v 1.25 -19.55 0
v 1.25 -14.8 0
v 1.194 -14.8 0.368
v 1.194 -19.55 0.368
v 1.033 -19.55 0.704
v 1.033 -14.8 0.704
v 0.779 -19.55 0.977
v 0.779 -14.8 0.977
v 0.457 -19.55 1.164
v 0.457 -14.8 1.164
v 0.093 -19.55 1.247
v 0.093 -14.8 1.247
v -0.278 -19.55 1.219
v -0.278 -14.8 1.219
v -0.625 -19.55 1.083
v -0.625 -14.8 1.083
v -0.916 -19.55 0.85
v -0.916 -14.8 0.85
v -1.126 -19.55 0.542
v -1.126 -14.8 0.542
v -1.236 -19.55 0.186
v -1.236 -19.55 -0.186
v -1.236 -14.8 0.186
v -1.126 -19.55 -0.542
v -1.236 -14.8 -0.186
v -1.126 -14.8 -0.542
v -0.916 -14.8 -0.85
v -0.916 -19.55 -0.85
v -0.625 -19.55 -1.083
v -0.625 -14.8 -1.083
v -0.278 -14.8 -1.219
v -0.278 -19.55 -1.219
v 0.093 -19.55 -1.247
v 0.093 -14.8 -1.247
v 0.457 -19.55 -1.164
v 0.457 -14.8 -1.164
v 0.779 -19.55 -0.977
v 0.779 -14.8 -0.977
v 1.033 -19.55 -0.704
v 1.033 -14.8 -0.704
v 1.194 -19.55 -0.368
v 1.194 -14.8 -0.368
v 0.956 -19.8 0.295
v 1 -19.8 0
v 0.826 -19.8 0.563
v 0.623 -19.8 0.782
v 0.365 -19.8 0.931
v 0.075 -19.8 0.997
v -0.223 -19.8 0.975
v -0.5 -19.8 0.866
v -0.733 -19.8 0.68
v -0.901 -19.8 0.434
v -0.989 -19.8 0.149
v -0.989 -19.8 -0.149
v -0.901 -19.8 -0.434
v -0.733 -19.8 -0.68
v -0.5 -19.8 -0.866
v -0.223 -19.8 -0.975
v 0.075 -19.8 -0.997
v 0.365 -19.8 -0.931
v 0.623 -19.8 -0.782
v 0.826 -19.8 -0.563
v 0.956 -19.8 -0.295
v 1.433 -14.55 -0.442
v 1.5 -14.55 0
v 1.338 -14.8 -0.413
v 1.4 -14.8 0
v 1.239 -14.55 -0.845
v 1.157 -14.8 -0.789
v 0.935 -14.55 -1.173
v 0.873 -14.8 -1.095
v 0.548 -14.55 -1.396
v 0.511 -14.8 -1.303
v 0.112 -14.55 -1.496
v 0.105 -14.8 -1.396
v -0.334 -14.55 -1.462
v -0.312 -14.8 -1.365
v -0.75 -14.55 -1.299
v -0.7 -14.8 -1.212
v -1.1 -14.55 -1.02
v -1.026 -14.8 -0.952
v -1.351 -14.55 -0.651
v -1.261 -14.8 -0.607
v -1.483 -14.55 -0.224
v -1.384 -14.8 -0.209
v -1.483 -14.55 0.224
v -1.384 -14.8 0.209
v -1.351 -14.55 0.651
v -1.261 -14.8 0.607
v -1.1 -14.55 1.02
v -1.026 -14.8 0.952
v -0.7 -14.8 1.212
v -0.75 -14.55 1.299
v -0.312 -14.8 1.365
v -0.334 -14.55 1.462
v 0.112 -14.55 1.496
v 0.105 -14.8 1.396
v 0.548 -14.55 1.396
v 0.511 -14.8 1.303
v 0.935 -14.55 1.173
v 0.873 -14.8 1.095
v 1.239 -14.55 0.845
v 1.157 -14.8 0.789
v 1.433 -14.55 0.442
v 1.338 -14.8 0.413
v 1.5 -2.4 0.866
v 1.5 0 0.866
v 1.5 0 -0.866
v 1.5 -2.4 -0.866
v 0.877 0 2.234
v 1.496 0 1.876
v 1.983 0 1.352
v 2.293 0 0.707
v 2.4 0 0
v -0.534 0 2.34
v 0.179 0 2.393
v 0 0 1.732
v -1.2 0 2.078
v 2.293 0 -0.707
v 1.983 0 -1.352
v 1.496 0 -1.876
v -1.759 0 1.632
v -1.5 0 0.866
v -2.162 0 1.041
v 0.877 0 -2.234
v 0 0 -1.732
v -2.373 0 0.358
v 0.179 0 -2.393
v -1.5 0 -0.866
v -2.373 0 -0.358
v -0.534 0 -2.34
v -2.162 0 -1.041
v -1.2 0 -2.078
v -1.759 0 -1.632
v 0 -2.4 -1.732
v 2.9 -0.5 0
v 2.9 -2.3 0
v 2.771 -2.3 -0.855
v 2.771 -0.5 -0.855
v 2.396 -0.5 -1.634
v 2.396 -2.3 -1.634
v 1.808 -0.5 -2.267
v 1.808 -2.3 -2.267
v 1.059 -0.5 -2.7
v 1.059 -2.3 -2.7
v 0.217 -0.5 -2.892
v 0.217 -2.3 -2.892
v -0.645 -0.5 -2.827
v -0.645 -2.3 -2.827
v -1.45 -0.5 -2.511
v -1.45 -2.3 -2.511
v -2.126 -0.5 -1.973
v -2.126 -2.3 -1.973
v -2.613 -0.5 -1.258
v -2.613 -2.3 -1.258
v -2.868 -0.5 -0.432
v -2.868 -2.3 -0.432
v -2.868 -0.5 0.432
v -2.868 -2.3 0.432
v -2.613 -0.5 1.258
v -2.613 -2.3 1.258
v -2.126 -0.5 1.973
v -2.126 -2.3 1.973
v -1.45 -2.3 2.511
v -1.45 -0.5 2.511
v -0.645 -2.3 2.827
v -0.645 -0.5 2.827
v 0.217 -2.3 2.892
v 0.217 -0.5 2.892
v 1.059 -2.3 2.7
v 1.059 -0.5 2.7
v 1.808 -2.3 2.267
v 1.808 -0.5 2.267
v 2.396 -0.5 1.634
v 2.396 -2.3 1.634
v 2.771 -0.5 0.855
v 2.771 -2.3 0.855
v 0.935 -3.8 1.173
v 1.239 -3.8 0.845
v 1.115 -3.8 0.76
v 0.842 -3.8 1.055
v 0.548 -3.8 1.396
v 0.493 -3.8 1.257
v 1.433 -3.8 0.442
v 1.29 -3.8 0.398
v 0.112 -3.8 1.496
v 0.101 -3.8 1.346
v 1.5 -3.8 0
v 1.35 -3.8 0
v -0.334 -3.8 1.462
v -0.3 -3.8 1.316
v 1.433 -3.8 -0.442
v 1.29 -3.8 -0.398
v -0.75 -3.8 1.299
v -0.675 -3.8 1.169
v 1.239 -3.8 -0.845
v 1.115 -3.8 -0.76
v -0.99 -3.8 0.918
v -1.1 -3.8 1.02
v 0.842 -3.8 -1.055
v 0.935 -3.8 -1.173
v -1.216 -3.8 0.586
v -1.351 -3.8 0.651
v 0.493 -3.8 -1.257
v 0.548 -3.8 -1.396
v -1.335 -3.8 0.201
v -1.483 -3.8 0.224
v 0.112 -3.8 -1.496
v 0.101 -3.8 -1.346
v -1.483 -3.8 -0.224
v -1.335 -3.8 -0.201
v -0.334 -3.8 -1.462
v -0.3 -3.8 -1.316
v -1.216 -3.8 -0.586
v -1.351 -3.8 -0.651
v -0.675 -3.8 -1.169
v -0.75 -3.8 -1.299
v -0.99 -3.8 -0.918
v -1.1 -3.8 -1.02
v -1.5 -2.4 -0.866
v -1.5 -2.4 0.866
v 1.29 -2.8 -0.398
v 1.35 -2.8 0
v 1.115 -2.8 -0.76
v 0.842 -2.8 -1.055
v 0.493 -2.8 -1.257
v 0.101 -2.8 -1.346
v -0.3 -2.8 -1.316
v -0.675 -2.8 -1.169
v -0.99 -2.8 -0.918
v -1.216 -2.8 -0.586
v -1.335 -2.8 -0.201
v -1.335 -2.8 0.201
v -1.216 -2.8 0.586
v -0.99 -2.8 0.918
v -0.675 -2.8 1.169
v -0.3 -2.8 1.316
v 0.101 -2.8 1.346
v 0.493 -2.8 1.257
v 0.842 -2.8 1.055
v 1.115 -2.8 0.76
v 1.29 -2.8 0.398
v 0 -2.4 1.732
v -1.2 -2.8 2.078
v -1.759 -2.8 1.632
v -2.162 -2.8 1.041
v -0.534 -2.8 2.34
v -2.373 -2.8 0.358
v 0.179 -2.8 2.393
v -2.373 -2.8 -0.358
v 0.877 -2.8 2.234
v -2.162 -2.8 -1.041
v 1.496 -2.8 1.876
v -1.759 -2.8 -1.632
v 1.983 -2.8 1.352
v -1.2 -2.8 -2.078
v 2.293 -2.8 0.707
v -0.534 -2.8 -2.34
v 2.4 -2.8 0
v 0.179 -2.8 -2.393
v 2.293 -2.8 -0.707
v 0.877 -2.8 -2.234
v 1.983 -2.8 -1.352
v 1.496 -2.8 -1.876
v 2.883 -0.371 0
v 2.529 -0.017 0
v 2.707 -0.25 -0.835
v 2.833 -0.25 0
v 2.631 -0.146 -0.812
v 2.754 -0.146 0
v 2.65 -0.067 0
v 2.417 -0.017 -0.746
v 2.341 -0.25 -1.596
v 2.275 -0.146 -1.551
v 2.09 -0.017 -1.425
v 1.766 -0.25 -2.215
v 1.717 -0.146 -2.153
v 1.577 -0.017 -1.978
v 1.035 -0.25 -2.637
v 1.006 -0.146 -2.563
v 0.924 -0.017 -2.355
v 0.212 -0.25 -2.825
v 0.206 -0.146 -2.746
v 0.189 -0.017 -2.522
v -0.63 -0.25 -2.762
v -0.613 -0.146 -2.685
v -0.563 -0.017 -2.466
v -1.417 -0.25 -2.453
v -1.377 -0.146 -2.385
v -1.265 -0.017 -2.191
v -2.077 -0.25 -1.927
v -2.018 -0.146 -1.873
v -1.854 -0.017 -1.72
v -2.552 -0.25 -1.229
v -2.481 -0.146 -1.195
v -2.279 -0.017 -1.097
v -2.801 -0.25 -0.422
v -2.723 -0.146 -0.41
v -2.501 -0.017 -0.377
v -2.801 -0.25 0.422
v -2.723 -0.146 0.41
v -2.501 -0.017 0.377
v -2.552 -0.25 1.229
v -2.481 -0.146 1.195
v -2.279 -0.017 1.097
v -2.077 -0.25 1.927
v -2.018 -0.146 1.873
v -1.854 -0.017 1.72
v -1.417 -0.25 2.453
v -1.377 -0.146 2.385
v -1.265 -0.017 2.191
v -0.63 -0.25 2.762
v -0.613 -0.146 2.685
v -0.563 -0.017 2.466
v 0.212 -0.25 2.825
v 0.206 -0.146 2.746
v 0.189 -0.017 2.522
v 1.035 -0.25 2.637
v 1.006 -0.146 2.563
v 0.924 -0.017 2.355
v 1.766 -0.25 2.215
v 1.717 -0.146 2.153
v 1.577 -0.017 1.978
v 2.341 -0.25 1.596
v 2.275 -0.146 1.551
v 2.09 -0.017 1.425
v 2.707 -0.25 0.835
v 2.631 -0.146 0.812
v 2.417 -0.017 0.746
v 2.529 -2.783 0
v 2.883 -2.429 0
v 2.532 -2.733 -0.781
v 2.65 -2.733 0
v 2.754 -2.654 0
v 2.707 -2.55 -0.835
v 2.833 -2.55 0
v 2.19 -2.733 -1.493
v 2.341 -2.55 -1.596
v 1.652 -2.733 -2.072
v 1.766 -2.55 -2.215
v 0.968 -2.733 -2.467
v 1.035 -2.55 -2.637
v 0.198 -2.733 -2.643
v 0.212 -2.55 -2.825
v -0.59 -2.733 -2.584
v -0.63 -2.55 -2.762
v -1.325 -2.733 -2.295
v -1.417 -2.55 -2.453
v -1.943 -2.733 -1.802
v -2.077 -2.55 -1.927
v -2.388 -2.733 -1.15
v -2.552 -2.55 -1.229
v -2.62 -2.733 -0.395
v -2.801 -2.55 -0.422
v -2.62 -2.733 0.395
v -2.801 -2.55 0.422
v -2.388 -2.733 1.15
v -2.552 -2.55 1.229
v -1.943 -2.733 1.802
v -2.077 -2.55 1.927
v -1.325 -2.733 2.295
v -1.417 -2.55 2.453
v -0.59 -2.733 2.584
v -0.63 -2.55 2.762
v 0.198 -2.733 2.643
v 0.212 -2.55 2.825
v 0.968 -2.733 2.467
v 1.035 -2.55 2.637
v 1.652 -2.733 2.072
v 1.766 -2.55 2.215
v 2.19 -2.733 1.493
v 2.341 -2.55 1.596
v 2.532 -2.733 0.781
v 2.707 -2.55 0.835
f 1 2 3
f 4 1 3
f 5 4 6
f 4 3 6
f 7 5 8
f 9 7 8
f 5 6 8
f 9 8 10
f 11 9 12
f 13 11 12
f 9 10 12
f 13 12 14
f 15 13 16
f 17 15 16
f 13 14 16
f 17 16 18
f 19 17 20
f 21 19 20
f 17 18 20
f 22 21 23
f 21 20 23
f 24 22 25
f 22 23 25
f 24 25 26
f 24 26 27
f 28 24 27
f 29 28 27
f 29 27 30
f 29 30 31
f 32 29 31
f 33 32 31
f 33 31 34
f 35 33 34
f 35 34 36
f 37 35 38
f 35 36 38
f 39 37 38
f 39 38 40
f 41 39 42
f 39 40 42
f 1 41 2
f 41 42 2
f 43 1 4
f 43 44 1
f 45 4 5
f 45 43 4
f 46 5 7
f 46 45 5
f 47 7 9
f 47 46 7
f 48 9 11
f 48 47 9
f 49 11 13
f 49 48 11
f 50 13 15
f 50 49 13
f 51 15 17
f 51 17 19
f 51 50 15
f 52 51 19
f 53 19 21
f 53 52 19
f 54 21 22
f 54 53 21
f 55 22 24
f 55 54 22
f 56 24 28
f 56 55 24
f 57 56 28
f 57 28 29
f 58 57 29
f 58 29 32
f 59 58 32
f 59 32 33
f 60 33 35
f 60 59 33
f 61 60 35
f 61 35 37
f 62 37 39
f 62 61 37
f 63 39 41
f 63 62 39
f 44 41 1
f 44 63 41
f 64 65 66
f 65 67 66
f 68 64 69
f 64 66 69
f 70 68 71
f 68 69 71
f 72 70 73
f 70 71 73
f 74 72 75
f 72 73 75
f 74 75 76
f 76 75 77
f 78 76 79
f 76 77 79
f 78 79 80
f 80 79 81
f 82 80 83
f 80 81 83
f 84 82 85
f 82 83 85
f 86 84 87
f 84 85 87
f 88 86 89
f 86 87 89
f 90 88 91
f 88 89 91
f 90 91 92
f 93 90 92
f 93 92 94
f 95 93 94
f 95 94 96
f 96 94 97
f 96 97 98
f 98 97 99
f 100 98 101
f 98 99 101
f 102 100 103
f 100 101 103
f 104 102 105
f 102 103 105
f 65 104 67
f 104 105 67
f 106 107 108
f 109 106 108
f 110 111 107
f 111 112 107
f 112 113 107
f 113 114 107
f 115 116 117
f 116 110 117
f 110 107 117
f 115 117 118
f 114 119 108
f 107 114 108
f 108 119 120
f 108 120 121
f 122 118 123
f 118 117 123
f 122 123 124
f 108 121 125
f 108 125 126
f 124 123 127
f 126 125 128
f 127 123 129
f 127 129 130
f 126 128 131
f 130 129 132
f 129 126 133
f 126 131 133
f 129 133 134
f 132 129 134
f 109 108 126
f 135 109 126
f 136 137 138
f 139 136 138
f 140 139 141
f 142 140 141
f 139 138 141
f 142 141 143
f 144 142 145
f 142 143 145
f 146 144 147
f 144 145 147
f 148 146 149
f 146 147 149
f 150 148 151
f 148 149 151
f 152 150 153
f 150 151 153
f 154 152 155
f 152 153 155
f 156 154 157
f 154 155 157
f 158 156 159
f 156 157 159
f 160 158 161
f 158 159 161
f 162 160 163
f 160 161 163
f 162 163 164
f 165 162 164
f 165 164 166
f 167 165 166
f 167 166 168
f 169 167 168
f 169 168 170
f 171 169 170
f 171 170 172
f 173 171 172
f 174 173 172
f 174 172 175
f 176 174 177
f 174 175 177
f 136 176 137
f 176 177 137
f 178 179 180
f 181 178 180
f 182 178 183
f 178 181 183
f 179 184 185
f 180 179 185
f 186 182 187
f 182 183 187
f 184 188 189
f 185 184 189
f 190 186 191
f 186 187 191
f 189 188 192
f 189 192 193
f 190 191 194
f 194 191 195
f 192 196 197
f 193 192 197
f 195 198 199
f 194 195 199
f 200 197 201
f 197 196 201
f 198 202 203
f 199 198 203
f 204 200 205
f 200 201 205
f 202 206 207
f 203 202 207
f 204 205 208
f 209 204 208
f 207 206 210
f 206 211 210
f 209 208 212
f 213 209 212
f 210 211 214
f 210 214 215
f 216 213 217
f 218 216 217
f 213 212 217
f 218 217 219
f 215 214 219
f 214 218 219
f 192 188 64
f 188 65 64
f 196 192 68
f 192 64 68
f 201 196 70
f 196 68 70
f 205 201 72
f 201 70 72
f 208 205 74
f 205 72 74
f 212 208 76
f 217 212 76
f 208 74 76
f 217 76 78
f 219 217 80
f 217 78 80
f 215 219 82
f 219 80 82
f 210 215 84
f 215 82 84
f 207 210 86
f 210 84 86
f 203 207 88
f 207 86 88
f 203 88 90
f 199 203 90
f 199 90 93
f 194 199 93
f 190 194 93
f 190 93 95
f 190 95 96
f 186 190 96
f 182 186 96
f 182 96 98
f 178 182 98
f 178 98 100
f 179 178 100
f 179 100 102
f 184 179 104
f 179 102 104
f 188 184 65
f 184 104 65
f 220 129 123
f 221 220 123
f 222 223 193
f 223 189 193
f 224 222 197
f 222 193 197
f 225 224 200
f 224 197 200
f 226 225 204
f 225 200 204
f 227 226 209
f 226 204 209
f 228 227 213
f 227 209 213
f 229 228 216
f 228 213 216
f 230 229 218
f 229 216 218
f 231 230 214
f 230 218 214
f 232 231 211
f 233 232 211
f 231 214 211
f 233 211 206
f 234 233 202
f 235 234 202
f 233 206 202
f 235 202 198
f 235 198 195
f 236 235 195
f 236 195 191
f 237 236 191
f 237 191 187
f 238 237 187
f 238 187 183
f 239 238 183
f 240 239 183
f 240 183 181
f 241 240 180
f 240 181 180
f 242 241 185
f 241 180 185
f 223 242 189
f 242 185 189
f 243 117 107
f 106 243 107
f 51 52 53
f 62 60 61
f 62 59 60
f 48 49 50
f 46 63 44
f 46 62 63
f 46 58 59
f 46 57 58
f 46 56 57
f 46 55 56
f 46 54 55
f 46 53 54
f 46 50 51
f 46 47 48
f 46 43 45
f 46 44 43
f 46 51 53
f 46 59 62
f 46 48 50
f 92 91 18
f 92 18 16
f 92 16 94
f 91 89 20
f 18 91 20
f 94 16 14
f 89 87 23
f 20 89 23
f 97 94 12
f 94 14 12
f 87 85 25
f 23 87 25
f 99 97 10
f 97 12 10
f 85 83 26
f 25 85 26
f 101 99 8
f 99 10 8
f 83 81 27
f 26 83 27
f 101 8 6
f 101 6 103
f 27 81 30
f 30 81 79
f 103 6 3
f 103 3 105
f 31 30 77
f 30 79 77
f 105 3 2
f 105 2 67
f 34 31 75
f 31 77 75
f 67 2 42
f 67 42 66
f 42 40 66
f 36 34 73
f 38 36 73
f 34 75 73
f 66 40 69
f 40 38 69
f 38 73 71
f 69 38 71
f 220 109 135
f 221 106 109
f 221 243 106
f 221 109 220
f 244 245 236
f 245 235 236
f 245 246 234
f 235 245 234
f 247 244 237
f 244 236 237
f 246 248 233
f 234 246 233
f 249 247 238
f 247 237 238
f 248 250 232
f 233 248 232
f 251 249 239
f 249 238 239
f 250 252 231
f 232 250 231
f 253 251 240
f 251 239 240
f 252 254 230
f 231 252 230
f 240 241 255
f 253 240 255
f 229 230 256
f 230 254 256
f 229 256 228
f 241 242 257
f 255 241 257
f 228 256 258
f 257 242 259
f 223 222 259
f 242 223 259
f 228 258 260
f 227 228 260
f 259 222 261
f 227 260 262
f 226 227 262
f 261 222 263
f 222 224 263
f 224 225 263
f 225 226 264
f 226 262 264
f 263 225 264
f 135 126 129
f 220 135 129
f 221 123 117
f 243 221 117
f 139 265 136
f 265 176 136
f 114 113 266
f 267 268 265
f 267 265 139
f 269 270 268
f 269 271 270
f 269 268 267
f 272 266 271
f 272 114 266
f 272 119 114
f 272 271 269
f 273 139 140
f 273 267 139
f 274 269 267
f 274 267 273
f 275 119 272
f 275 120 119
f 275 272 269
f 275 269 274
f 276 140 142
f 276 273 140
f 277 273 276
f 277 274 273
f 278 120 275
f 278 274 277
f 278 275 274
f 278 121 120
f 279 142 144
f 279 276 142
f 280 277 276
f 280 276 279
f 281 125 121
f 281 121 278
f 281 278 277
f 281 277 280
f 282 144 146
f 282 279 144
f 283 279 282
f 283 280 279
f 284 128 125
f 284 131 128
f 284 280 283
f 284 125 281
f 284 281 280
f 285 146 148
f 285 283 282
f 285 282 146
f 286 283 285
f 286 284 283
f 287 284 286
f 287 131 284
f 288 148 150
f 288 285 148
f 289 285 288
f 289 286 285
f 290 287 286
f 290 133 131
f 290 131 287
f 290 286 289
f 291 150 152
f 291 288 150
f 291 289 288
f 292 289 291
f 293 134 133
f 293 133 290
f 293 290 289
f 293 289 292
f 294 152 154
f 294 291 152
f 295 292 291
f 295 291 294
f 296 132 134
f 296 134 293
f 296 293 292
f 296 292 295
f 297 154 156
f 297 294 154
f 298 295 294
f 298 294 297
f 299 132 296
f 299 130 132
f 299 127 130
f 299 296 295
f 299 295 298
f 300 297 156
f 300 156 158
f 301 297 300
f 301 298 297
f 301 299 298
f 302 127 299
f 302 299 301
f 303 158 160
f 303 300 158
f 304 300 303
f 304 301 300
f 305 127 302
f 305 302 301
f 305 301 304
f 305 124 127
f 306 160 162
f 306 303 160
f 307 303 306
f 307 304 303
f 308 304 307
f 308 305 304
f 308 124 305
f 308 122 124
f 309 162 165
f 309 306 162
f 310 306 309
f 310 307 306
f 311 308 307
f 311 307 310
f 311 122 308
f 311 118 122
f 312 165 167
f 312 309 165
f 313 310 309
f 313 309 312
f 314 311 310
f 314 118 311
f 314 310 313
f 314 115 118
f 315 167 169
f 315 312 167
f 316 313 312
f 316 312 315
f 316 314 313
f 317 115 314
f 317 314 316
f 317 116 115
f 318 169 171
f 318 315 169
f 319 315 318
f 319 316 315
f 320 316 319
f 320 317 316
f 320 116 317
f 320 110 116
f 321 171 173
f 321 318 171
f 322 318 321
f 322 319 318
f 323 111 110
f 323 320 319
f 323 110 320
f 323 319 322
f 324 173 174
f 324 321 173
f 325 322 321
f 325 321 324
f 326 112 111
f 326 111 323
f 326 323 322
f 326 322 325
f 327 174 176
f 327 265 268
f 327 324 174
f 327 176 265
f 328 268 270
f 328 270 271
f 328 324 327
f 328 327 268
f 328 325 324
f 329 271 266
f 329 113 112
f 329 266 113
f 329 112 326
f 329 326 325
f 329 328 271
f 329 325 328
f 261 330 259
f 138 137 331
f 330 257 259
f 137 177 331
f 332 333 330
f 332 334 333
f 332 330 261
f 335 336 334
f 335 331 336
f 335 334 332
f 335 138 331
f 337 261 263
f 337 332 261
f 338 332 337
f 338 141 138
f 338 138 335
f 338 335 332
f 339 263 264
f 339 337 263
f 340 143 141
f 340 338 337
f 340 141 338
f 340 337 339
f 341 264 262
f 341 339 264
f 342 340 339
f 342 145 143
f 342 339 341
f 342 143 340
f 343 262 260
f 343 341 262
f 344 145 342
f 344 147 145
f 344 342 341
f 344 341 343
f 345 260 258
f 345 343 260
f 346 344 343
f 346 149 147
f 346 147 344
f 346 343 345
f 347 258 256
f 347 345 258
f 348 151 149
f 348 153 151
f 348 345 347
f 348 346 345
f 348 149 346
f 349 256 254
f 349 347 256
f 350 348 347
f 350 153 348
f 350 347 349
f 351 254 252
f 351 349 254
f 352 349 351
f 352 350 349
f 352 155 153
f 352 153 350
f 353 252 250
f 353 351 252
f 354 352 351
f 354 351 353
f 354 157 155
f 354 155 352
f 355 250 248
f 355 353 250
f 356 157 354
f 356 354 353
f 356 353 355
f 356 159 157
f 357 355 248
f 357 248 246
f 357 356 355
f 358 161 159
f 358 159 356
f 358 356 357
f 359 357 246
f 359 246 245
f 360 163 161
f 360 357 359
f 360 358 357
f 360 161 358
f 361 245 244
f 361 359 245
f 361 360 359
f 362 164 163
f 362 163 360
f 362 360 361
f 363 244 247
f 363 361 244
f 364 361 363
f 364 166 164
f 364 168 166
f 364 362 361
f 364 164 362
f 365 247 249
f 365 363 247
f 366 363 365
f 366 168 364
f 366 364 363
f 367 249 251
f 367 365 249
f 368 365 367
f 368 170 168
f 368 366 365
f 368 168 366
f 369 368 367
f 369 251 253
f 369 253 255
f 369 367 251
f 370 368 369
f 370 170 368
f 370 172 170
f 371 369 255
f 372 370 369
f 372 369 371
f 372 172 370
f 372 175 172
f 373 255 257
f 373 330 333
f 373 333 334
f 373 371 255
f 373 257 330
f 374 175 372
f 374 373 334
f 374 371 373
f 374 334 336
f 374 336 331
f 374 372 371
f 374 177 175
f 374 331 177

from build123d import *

# Parameters (mm, degrees)
SKETCH_2_R          = 1.25
EXTRUDE_1_DEPTH     = 4.75
SKETCH_3_R          = 1.25
EXTRUDE_2_DEPTH     = 0.25
EXTRUDE_2_TAPER     = 45
CUT_EXTRUDE_1_DEPTH = 2.4
FILLET_1_R          = 0.5


with BuildPart() as part:
    # 草图1 → 旋转1 (revolve)
    with BuildSketch(Plane(origin=(0, 0, 0), x_dir=(-1, 0, 0), z_dir=(0, 0, -1))):
        Polygon((-1.4, -14.8), (0, -14.8), (0, 0), (-2.9, 0), (-2.9, -2.8), (-1.35, -2.8), (-1.35, -3.8), (-1.5, -3.8), (-1.5, -14.55), align=None)
    revolve(axis=Axis((0, -14.8, 0), (0, 1, 0)))

    # 草图2 → 凸台-拉伸1 (add)
    with BuildSketch(Plane.XZ.offset(14.8)):
        Circle(SKETCH_2_R)
    extrude(amount=EXTRUDE_1_DEPTH)

    # 草图3 → 凸台-拉伸2 (add)
    with BuildSketch(Plane.XZ.offset(19.55)):
        Circle(SKETCH_3_R)
    extrude(amount=EXTRUDE_2_DEPTH, taper=EXTRUDE_2_TAPER)

    # 草图4 → 切除-拉伸1 (cut)
    with BuildSketch(Plane(origin=(0, 0, 0), x_dir=(-1, 0, 0), z_dir=(0, 1, 0))):
        Polygon((-1.5, 0.866025404), (-1.5, -0.866025404), (0, -1.732050808), (1.5, -0.866025404), (1.5, 0.866025404), (0, 1.732050808), align=None)
    extrude(amount=-CUT_EXTRUDE_1_DEPTH, mode=Mode.SUBTRACT)

    # 圆角1
    fillet_1_edges = [part.edges().sort_by_distance(p)[0] for p in [
        (-2.9, -2.8, 0),
        (-2.9, 0, 0),
    ]]
    fillet(fillet_1_edges, radius=FILLET_1_R)


solid = part.part
